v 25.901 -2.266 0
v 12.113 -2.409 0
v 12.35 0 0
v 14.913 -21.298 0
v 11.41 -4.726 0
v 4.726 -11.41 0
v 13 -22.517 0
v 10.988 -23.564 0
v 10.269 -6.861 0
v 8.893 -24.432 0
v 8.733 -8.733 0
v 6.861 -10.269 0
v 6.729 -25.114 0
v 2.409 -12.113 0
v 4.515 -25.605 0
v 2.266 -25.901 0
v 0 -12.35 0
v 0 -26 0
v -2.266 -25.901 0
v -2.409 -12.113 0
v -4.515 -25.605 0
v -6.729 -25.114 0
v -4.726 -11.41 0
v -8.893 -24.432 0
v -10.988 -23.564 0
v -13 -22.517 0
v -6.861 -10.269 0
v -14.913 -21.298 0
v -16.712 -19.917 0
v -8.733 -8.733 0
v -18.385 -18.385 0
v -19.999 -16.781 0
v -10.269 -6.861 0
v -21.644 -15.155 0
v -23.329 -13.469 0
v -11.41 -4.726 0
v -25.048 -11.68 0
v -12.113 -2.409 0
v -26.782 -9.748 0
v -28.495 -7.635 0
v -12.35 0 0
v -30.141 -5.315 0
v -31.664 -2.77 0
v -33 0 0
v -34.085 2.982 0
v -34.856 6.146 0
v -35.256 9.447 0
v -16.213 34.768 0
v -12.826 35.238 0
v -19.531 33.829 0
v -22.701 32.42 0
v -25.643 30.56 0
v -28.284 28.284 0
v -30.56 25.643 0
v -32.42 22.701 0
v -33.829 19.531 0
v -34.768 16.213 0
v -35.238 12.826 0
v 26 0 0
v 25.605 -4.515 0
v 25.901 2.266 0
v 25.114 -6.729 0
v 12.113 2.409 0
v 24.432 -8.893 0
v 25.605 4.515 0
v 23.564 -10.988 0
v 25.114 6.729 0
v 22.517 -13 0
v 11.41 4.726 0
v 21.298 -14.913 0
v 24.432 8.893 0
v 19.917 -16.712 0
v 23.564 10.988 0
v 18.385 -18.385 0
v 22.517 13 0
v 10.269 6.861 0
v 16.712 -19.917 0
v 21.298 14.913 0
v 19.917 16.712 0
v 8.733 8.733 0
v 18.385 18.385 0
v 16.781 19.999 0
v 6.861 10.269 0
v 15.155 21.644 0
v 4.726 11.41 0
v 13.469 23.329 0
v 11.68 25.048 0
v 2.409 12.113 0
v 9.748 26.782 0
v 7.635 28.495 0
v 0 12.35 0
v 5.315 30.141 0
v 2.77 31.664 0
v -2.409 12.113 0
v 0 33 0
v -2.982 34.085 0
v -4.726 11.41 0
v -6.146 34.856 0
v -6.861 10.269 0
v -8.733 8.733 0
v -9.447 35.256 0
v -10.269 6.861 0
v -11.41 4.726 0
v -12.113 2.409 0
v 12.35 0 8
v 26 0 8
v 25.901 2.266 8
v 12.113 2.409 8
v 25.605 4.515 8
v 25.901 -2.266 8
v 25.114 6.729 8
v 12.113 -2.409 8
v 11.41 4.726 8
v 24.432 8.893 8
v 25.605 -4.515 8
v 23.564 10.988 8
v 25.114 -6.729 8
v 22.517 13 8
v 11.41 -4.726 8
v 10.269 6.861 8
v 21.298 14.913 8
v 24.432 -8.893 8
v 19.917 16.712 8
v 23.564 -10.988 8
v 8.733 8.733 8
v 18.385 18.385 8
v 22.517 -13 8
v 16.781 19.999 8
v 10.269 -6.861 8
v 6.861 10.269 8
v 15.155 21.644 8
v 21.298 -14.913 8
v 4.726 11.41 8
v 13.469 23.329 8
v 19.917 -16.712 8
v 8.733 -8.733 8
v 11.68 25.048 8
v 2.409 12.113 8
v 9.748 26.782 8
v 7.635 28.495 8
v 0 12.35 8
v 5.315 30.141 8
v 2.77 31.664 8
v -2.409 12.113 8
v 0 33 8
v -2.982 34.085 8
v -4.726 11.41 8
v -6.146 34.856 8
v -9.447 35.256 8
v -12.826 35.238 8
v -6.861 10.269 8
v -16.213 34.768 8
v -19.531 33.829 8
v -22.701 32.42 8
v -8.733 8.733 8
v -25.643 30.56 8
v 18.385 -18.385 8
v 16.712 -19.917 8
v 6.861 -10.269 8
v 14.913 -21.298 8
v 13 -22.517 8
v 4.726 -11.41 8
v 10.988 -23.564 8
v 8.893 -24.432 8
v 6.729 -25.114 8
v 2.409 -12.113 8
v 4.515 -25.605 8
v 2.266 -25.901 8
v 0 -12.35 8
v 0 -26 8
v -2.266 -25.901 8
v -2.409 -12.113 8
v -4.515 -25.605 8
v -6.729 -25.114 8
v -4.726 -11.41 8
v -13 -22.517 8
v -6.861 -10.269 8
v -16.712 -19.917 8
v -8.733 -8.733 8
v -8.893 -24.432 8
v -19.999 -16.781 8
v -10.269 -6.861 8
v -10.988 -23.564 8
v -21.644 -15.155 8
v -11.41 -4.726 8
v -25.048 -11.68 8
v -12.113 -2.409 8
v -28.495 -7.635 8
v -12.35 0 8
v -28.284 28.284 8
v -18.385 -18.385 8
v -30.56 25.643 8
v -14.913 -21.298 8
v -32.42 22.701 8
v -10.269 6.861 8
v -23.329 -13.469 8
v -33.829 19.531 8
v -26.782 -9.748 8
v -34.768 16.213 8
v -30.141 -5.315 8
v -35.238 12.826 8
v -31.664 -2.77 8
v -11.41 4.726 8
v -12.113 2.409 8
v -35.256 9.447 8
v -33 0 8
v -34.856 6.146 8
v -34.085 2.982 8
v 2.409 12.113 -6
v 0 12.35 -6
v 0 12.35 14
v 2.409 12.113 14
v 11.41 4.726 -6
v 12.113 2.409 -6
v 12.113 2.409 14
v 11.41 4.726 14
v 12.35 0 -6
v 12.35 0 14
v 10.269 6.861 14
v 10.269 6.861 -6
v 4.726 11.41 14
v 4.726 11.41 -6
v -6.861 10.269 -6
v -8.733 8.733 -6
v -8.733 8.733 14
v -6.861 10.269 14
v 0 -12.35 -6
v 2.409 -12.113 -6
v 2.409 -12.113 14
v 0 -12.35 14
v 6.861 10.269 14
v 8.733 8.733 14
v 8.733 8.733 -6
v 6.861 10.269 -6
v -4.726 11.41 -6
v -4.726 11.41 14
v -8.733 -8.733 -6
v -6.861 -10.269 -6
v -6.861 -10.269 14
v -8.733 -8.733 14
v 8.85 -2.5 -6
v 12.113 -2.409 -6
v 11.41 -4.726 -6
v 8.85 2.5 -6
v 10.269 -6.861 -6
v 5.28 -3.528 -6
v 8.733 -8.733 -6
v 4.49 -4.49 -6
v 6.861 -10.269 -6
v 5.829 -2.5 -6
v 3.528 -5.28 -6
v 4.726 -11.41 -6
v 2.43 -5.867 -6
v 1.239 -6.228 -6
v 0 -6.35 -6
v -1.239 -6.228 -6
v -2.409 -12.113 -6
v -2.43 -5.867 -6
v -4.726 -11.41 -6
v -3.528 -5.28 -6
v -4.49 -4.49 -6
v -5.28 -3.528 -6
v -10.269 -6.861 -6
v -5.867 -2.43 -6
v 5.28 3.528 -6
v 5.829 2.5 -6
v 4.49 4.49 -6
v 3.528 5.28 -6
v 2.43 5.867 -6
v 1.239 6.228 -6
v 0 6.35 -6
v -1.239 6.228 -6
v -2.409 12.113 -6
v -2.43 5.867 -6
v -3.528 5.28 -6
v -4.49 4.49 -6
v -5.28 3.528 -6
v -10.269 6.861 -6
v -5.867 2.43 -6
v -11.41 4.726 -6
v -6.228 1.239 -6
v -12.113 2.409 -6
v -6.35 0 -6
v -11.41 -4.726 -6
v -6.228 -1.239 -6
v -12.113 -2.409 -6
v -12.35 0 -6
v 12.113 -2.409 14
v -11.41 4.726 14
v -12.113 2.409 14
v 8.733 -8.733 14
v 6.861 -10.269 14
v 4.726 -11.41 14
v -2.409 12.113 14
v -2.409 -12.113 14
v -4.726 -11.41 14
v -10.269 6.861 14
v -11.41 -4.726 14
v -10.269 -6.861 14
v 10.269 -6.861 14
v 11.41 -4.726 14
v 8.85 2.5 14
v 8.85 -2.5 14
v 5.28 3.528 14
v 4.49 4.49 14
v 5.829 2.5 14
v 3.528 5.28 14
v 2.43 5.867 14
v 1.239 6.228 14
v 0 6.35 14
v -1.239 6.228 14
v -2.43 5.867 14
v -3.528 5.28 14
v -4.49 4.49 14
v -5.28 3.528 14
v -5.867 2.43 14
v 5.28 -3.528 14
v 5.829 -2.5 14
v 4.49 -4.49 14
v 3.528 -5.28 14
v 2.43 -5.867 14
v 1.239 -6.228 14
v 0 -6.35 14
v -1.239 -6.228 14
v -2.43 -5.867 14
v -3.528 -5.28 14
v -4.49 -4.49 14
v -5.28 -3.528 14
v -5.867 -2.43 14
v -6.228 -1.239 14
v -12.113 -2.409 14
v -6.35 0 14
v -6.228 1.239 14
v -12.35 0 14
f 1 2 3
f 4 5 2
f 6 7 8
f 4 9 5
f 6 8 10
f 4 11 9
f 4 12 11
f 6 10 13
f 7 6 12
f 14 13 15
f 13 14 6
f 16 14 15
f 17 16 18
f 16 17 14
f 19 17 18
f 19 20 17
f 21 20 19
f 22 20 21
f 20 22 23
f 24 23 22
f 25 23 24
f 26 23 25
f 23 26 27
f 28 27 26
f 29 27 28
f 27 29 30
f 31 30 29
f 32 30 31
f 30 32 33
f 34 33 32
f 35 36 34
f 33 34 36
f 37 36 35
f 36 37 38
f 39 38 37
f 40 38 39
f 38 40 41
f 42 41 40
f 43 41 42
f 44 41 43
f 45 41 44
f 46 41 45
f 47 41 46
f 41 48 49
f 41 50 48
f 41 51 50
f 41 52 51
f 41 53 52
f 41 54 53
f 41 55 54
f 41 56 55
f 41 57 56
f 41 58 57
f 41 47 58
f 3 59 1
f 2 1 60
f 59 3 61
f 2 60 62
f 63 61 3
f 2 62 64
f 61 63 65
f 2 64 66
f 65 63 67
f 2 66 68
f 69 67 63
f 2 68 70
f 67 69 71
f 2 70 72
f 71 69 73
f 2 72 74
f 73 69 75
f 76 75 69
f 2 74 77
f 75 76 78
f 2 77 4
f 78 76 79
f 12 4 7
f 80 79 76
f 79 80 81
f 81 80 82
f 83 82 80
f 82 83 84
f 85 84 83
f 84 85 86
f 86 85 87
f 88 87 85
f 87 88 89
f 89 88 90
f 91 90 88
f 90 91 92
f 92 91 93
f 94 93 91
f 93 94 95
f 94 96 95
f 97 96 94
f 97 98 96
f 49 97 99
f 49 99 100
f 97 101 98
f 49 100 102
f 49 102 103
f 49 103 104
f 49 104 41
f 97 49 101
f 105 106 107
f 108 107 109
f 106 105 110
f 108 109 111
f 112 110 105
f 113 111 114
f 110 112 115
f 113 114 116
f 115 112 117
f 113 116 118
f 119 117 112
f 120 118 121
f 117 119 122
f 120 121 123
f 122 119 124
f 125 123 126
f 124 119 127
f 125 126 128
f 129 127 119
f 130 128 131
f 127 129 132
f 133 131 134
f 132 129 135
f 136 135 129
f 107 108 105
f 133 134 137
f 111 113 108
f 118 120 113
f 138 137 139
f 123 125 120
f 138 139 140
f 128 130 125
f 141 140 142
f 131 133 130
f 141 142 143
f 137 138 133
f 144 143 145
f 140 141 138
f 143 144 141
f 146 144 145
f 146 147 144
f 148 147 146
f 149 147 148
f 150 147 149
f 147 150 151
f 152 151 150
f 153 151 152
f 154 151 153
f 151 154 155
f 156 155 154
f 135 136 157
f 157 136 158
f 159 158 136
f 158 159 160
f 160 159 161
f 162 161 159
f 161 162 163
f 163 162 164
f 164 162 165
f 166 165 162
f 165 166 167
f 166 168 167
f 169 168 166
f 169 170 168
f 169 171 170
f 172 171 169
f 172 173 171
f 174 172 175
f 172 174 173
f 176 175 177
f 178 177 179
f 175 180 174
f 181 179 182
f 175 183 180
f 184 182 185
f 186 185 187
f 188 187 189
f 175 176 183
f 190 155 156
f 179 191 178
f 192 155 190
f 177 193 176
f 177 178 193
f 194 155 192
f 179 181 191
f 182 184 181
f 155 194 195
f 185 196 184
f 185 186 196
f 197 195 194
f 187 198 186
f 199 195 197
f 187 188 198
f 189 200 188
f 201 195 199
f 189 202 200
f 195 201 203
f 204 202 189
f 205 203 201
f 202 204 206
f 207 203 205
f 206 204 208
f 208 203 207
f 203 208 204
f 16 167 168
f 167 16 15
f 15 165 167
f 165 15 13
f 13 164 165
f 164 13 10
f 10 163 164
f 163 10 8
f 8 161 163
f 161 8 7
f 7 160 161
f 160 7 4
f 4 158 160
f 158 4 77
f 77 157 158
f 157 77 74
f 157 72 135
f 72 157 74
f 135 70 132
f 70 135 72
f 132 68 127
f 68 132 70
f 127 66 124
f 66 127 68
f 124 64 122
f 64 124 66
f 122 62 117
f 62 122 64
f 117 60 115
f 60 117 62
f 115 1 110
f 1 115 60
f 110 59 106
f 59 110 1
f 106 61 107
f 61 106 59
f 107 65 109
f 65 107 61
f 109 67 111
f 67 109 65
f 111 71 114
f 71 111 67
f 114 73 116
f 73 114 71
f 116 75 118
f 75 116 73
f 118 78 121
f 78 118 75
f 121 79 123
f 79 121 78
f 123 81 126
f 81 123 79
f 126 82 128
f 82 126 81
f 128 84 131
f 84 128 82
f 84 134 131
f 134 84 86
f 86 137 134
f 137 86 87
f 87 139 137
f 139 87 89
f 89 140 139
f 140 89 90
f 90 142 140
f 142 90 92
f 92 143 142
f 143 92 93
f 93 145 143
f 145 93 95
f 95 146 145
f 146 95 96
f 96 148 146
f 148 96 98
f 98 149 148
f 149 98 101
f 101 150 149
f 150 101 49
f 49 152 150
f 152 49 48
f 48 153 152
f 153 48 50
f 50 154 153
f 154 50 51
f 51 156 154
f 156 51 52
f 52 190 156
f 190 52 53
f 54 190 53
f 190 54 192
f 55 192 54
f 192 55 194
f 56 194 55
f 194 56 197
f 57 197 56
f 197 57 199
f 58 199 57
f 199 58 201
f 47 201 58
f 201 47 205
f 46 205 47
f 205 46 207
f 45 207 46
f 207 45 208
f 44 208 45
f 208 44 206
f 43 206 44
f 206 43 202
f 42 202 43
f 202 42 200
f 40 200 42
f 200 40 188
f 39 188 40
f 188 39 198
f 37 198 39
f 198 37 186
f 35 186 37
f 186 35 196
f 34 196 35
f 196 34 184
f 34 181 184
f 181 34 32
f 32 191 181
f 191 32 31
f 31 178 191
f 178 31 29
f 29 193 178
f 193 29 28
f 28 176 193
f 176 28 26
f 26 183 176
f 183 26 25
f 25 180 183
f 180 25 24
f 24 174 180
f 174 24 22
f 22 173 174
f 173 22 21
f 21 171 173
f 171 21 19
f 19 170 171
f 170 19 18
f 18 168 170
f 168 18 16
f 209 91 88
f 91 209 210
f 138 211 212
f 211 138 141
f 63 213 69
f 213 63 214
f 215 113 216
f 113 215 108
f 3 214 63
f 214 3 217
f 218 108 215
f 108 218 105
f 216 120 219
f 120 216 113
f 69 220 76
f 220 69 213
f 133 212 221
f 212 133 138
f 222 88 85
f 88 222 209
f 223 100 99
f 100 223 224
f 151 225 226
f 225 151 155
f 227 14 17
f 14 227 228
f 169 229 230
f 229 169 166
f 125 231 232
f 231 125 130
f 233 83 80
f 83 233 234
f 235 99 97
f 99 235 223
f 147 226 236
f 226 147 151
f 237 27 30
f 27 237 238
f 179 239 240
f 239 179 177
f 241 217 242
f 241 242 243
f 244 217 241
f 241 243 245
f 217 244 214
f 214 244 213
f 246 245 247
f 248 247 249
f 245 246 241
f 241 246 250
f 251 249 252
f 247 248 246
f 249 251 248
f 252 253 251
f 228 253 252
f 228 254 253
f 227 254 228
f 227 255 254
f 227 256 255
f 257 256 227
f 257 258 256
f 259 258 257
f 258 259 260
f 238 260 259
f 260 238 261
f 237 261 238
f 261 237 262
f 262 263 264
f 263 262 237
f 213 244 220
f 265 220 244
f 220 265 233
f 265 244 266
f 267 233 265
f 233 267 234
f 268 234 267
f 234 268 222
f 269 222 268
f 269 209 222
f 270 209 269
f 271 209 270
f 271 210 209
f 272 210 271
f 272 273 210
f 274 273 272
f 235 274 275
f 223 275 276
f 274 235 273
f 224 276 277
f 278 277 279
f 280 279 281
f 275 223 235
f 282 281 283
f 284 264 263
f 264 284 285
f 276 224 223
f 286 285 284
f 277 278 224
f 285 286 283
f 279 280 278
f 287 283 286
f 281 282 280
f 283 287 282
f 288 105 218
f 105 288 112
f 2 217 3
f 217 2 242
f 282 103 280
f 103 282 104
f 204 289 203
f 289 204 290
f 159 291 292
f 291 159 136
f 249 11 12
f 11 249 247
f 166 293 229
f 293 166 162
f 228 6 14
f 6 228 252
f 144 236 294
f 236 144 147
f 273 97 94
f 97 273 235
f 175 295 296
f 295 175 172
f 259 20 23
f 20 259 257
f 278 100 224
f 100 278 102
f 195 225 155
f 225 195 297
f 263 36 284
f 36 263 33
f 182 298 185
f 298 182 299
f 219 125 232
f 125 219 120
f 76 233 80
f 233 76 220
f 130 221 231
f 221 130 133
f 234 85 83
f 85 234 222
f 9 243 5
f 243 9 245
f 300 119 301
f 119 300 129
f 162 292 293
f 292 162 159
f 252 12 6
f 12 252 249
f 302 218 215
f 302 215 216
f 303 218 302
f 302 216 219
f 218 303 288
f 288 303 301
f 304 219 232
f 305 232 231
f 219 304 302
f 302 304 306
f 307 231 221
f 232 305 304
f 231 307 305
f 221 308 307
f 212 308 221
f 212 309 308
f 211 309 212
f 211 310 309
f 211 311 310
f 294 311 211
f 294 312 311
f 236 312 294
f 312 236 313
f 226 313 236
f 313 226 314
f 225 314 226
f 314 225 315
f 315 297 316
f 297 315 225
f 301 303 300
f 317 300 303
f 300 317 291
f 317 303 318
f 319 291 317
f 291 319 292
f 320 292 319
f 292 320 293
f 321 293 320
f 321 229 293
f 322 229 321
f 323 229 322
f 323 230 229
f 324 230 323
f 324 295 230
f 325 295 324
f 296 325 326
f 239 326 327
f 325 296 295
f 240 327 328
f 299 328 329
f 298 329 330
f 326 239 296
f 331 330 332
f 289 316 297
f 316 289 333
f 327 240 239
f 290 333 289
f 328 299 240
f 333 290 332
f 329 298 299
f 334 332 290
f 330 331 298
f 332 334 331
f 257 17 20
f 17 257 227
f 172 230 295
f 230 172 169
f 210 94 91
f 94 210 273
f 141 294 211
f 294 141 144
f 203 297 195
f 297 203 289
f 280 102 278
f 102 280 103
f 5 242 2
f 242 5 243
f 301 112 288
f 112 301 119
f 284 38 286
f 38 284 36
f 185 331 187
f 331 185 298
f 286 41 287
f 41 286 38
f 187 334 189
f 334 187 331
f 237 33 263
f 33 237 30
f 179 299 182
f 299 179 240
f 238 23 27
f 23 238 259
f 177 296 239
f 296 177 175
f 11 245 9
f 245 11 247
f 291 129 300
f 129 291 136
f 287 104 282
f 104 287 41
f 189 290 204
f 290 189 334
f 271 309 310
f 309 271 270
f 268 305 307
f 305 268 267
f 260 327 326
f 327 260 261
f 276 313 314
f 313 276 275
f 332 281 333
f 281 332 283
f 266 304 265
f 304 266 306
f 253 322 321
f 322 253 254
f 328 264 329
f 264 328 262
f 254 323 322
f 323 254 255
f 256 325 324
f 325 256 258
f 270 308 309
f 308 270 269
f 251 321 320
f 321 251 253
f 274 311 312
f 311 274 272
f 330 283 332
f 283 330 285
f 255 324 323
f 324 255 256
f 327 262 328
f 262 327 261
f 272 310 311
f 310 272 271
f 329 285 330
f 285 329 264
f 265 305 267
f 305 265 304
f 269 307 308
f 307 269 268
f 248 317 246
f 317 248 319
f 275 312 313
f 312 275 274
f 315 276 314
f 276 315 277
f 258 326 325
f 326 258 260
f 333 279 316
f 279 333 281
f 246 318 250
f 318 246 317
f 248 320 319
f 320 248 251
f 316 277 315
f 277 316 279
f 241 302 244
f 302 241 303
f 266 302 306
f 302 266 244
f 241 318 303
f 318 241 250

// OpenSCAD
$fn = 32;

// ----------------------------------------------------------------------
// Cam: base radius 26 mm with a 14 mm lift over 180 degrees
// ----------------------------------------------------------------------

// --- parameters (mm) ---
base_r = 26;              // base radius
lift = 14;                // lift height above the base radius
lift_span = 180;          // angular width of the lift
lift_start = 45;          // angle where the lift starts
cam_t = 8;                // cam plate thickness
hub_d = 24.7;             // hub diameter
hub_h = 20;               // hub height
bore_d = 12.7;            // bore
key_w = 5;                // keyway width
key_depth = 2.5;          // keyway depth

cam_profile = [[26, 0], [25.901, 2.266], [25.605, 4.515], [25.114, 6.729], [24.432, 8.893], [23.564, 10.988], [22.517, 13], [21.298, 14.913], [19.917, 16.712], [18.385, 18.385], [16.781, 19.999], [15.155, 21.644], [13.469, 23.329], [11.68, 25.048], [9.748, 26.782], [7.635, 28.495], [5.315, 30.141], [2.77, 31.664], [0, 33], [-2.982, 34.085], [-6.146, 34.856], [-9.447, 35.256], [-12.826, 35.238], [-16.213, 34.768], [-19.531, 33.829], [-22.701, 32.42], [-25.643, 30.56], [-28.284, 28.284], [-30.56, 25.643], [-32.42, 22.701], [-33.829, 19.531], [-34.768, 16.213], [-35.238, 12.826], [-35.256, 9.447], [-34.856, 6.146], [-34.085, 2.982], [-33, 0], [-31.664, -2.77], [-30.141, -5.315], [-28.495, -7.635], [-26.782, -9.748], [-25.048, -11.68], [-23.329, -13.469], [-21.644, -15.155], [-19.999, -16.781], [-18.385, -18.385], [-16.712, -19.917], [-14.913, -21.298], [-13, -22.517], [-10.988, -23.564], [-8.893, -24.432], [-6.729, -25.114], [-4.515, -25.605], [-2.266, -25.901], [0, -26], [2.266, -25.901], [4.515, -25.605], [6.729, -25.114], [8.893, -24.432], [10.988, -23.564], [13, -22.517], [14.913, -21.298], [16.712, -19.917], [18.385, -18.385], [19.917, -16.712], [21.298, -14.913], [22.517, -13], [23.564, -10.988], [24.432, -8.893], [25.114, -6.729], [25.605, -4.515], [25.901, -2.266]];

difference() {
  union() {
    linear_extrude(height = cam_t) polygon(cam_profile);
    /* hub, proud of the cam plate on both sides */
    translate([0, 0, -6]) cylinder(h = hub_h, d = hub_d);
  }
  /* bore through the hub, 2.5 mm clear on both faces */
  translate([0, 0, -8.5]) cylinder(h = hub_h + 5, d = bore_d);
  /* keyway, milled through the whole hub */
  translate([3.85, -2.5, -8.5]) cube([5, 5, 25]);
}
